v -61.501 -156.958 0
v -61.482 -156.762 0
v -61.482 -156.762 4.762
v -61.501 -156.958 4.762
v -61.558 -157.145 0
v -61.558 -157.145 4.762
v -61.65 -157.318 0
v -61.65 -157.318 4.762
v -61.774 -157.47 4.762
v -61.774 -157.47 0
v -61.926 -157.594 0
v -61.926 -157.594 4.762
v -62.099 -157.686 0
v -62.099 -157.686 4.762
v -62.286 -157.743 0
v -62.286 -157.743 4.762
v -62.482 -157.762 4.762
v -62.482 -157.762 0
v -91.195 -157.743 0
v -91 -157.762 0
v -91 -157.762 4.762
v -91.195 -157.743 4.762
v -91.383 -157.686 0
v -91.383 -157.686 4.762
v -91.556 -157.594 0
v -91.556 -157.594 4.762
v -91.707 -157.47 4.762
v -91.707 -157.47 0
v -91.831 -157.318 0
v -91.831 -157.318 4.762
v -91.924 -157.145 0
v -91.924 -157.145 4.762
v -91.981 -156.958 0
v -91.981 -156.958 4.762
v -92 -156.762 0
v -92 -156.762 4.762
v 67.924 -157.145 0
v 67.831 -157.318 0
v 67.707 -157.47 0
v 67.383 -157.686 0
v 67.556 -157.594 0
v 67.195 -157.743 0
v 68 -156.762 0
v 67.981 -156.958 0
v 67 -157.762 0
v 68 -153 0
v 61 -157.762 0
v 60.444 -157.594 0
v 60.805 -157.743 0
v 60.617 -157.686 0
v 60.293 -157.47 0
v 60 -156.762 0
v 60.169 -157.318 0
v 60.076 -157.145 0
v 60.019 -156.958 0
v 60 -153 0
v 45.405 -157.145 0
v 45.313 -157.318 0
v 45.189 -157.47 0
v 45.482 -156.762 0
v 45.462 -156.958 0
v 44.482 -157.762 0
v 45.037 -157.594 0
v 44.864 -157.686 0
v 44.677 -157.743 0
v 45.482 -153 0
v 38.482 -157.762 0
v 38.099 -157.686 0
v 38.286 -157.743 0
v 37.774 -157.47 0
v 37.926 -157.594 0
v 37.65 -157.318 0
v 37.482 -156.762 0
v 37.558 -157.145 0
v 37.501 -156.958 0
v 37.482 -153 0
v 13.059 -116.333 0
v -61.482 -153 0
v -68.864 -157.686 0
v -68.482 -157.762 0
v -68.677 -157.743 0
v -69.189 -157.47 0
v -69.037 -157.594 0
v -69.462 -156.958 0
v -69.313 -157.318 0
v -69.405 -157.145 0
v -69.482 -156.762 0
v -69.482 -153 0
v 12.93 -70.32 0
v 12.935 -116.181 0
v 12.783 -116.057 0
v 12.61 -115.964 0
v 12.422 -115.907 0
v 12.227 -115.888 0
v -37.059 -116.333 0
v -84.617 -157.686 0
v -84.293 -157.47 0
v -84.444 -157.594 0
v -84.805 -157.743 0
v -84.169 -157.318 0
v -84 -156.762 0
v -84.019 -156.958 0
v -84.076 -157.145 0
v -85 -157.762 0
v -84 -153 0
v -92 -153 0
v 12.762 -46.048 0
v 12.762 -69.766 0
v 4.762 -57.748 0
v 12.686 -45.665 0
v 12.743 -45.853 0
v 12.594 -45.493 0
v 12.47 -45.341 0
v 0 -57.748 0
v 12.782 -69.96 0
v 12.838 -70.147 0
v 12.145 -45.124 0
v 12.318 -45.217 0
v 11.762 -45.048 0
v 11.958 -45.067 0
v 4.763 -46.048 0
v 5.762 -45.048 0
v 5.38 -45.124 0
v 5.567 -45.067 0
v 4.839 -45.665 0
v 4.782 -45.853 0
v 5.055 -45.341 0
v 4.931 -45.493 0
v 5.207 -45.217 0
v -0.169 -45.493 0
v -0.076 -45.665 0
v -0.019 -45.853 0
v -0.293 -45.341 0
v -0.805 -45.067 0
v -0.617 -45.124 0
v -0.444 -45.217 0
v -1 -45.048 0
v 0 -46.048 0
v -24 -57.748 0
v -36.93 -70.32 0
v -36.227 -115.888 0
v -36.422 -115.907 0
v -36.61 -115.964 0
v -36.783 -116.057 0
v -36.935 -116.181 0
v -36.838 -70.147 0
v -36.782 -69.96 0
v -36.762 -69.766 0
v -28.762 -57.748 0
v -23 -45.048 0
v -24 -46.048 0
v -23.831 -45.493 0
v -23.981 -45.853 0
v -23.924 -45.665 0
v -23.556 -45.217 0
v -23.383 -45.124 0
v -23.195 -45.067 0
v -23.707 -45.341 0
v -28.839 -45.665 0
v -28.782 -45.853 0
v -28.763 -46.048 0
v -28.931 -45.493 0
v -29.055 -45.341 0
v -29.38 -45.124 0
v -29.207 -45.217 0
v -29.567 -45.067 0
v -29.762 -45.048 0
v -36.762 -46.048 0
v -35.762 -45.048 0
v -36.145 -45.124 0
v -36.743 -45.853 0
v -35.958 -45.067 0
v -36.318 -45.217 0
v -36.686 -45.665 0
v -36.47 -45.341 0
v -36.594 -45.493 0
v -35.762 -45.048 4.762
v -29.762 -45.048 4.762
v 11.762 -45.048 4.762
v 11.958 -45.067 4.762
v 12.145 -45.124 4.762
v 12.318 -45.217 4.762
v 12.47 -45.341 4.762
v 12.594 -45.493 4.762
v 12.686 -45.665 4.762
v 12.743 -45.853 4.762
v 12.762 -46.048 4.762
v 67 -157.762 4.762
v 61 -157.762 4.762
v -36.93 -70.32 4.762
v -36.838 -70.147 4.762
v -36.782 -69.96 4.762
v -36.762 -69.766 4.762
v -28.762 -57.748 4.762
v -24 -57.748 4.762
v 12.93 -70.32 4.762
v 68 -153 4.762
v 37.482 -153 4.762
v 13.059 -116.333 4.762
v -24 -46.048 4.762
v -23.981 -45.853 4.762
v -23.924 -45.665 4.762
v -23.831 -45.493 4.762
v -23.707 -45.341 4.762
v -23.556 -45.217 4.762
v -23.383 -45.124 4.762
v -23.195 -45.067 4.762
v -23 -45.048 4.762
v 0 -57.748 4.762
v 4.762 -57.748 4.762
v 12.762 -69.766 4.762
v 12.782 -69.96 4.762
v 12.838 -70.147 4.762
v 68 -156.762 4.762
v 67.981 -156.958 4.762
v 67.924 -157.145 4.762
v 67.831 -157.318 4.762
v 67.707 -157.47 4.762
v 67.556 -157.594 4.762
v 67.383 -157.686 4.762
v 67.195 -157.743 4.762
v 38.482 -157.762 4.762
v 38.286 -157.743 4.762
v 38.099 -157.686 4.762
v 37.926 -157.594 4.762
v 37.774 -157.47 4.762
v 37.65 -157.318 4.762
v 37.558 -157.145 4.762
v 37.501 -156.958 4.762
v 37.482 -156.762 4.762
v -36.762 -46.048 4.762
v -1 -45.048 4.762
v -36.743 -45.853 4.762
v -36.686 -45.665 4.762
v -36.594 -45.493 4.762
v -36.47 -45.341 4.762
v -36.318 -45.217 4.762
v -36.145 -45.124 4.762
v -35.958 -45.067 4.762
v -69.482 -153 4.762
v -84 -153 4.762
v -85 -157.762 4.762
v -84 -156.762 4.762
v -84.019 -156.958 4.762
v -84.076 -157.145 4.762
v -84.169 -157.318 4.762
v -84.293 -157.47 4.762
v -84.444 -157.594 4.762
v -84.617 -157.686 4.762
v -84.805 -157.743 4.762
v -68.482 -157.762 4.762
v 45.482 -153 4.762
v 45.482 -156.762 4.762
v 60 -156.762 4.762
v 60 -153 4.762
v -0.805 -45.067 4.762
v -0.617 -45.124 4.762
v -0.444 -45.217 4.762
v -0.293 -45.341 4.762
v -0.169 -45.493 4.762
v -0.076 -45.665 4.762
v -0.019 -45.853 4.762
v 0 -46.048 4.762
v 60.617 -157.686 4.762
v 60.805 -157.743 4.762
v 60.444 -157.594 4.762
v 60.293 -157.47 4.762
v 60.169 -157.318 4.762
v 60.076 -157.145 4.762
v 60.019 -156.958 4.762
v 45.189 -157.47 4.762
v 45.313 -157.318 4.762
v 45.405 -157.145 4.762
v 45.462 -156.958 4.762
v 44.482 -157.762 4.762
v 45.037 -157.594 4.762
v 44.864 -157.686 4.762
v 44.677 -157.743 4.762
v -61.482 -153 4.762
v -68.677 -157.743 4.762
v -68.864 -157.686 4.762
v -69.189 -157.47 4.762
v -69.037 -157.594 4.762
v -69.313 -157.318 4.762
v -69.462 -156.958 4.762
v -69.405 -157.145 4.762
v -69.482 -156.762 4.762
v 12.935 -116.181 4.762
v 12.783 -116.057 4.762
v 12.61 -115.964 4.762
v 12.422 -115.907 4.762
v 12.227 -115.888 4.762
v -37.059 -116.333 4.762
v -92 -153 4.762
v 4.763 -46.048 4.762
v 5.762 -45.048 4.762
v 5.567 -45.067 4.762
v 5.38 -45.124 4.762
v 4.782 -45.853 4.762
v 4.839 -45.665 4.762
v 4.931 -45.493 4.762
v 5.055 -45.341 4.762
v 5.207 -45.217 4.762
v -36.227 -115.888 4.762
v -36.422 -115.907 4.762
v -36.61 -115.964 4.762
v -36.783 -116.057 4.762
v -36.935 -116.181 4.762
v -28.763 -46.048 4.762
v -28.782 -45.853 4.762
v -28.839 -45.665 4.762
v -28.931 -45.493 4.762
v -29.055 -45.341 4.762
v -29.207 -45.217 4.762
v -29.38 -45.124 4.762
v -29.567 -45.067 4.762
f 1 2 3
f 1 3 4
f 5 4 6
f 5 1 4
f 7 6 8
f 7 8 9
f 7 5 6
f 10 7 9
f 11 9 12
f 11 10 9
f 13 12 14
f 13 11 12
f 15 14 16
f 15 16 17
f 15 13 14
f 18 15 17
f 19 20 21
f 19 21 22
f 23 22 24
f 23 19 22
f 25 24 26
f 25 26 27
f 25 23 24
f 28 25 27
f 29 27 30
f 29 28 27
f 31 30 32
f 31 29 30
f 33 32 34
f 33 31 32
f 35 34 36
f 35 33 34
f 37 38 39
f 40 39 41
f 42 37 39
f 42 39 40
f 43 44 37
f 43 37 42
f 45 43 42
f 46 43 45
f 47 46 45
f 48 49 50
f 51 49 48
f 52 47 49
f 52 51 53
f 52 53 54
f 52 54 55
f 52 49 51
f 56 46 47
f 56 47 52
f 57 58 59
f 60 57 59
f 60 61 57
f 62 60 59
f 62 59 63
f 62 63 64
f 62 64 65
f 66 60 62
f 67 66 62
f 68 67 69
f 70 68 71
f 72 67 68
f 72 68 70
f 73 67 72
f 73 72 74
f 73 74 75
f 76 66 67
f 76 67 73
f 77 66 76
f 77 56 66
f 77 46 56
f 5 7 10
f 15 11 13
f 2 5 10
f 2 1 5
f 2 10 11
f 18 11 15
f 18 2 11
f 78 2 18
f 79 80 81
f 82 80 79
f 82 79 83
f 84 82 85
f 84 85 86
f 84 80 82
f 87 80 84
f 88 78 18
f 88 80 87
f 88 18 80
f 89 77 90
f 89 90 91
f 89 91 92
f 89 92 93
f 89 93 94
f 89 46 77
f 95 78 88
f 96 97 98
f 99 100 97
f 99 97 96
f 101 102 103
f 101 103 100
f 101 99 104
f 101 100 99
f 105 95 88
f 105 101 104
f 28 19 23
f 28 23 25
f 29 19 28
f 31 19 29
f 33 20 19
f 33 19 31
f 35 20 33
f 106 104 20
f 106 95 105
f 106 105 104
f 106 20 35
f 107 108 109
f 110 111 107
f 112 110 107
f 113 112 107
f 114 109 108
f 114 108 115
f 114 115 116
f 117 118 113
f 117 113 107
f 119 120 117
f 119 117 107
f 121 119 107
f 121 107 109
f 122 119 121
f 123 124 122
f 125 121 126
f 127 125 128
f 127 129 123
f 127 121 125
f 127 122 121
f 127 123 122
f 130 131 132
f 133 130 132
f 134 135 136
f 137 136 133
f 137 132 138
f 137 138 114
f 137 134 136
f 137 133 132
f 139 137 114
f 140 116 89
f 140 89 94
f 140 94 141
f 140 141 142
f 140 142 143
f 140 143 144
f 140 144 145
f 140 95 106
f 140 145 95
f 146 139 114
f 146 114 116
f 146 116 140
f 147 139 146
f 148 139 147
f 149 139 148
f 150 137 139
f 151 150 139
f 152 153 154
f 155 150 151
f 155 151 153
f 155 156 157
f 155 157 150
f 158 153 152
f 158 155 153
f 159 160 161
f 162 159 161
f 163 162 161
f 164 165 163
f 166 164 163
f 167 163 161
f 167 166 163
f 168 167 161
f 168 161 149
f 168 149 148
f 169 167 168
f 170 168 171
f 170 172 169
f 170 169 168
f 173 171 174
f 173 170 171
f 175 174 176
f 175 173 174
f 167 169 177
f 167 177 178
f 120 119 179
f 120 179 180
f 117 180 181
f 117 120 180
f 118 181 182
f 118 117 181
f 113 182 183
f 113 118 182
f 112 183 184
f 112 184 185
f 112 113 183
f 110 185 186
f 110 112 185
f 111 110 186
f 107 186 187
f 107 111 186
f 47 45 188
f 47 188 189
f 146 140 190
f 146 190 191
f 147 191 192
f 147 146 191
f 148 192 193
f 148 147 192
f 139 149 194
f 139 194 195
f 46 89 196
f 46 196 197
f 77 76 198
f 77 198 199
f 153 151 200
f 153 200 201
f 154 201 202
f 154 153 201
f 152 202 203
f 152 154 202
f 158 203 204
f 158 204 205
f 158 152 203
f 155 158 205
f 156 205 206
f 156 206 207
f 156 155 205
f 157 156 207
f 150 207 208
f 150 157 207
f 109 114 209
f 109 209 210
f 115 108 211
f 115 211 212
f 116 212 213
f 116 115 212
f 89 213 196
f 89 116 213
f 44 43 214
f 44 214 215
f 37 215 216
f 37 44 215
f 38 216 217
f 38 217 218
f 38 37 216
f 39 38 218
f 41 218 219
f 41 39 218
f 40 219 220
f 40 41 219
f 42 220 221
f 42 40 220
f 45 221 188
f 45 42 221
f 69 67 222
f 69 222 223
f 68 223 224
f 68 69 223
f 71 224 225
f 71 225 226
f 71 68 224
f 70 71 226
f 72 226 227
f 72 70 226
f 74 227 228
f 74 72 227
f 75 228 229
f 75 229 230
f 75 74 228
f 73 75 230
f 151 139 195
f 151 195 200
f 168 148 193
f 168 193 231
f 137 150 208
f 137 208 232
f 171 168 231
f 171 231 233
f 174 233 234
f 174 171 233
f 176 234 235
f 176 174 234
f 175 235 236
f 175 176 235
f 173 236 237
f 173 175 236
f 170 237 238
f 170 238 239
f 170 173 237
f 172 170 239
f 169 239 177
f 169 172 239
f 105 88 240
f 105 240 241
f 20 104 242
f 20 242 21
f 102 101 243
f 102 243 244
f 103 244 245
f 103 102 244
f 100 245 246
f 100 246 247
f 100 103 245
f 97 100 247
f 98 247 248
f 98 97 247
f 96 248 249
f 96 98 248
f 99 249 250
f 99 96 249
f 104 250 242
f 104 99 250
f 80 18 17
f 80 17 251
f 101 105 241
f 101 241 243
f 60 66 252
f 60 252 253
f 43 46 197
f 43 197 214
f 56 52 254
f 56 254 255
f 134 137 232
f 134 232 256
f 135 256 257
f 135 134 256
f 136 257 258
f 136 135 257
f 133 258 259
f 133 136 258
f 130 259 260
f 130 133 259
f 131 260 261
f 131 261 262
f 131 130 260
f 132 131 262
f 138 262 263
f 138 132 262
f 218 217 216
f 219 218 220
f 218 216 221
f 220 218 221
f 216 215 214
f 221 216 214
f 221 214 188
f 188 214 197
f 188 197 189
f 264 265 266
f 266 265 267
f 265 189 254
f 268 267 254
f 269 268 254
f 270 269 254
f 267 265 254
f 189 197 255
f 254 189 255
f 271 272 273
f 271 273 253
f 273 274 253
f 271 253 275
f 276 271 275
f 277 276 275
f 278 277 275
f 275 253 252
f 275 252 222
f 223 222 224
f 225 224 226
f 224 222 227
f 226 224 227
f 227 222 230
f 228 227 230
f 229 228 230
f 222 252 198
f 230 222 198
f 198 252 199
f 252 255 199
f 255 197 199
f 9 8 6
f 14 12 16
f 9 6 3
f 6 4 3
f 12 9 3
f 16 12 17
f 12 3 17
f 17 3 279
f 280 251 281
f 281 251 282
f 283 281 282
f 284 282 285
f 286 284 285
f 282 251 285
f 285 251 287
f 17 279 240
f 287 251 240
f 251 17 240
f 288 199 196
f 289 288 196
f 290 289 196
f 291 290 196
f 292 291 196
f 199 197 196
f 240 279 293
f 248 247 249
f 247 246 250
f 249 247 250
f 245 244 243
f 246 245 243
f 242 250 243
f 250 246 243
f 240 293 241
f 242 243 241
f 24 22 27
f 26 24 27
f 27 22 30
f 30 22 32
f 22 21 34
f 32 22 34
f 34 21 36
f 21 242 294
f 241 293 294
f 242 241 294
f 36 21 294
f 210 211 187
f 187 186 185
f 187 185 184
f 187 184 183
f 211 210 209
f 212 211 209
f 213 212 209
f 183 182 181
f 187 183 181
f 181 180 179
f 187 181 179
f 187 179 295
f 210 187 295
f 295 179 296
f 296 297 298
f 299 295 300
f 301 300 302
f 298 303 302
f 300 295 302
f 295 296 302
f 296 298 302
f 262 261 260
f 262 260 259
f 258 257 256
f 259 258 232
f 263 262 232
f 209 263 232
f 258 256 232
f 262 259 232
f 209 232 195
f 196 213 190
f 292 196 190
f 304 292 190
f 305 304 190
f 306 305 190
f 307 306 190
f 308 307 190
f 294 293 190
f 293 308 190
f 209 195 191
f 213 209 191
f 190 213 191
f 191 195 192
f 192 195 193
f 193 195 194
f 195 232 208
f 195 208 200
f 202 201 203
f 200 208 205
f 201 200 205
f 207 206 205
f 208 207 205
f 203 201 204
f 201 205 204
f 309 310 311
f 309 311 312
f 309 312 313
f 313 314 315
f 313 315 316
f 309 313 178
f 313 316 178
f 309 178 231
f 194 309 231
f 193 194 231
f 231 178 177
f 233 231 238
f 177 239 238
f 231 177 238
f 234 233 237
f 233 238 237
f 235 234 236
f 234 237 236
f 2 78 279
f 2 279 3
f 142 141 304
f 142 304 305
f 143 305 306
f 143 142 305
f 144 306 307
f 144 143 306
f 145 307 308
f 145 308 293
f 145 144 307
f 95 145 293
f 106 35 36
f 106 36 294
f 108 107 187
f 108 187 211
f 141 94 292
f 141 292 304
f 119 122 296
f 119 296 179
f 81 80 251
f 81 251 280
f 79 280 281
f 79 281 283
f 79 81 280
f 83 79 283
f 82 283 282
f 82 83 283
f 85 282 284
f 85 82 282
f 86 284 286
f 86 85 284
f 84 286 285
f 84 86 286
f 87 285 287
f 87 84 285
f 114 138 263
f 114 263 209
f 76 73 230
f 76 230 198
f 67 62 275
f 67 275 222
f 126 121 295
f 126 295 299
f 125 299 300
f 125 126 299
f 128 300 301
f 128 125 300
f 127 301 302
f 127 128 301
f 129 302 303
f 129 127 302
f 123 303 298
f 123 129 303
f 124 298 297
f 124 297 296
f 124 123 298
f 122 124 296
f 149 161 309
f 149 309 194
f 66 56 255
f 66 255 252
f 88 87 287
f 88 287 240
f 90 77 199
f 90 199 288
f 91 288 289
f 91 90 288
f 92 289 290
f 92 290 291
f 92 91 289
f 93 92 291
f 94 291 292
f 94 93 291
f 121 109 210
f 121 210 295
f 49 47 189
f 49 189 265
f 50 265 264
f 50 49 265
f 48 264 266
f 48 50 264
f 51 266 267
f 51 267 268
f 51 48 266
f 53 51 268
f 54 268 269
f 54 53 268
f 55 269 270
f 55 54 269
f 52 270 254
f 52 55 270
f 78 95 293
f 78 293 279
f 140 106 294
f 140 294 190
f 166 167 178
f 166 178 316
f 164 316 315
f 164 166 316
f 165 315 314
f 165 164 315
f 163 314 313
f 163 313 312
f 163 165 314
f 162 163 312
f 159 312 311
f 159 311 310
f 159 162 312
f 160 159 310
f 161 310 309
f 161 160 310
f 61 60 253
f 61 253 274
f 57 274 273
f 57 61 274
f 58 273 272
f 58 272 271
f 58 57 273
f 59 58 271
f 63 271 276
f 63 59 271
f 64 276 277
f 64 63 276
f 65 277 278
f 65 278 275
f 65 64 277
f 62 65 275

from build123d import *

# Parameters (mm, degrees)
BOSS_EXTRUDE1_DEPTH = 4.7625


with BuildPart() as part:
    # Sketch2 → Boss-Extrude1 (new body)
    with BuildSketch(Plane.XY):
        with BuildLine():
            Line((-23, -45.048102255), (-1, -45.048102255))
            ThreePointArc((-1, -45.048102255), (-0.292893219, -45.340995473), (0, -46.048102255))
            Line((0, -46.048102255), (0, -57.748102255))
            Line((0, -57.748102255), (4.7625, -57.748102255))
            Line((4.7625, -57.748102255), (4.7625, -46.048102255))
            ThreePointArc((4.7625, -46.048102255), (5.055393219, -45.340995473), (5.7625, -45.048102255))
            Line((5.7625, -45.048102255), (11.7625, -45.048102255))
            ThreePointArc((11.7625, -45.048102255), (12.469606781, -45.340995473), (12.7625, -46.048102255))
            Line((12.7625, -46.048102255), (12.7625, -69.765561421))
            ThreePointArc((12.7625, -69.765561421), (12.805346982, -70.055144052), (12.9302162, -70.319911199))
            Line((12.9302162, -70.319911199), (68, -153))
            Line((68, -153), (68, -156.7625))
            ThreePointArc((68, -156.7625), (67.707106781, -157.469606781), (67, -157.7625))
            Line((67, -157.7625), (61, -157.7625))
            ThreePointArc((61, -157.7625), (60.292893219, -157.469606781), (60, -156.7625))
            Line((60, -156.7625), (60, -153))
            Line((60, -153), (45.481563848, -153))
            Line((45.481563848, -153), (45.481563848, -156.7625))
            ThreePointArc((45.481563848, -156.7625), (45.188670629, -157.469606781), (44.481563848, -157.7625))
            Line((44.481563848, -157.7625), (38.481563848, -157.7625))
            ThreePointArc((38.481563848, -157.7625), (37.774457067, -157.469606781), (37.481563848, -156.7625))
            Line((37.481563848, -156.7625), (37.481563848, -153))
            Line((37.481563848, -153), (13.059329161, -116.333203921))
            ThreePointArc((13.059329161, -116.333203921), (12.699088908, -116.005978468), (12.227045361, -115.8875537))
            Line((12.227045361, -115.8875537), (-36.227045361, -115.8875537))
            ThreePointArc((-36.227045361, -115.8875537), (-36.699088908, -116.005978468), (-37.059329161, -116.333203921))
            Line((-37.059329161, -116.333203921), (-61.481563848, -153))
            Line((-61.481563848, -153), (-61.481563848, -156.7625))
            ThreePointArc((-61.481563848, -156.7625), (-61.774457067, -157.469606781), (-62.481563848, -157.7625))
            Line((-62.481563848, -157.7625), (-68.481563848, -157.7625))
            ThreePointArc((-68.481563848, -157.7625), (-69.188670629, -157.469606781), (-69.481563848, -156.7625))
            Line((-69.481563848, -156.7625), (-69.481563848, -153))
            Line((-69.481563848, -153), (-84, -153))
            Line((-84, -153), (-84, -156.7625))
            ThreePointArc((-84, -156.7625), (-84.292893219, -157.469606781), (-85, -157.7625))
            Line((-85, -157.7625), (-91, -157.7625))
            ThreePointArc((-91, -157.7625), (-91.707106781, -157.469606781), (-92, -156.7625))
            Line((-92, -156.7625), (-92, -153))
            Line((-92, -153), (-36.9302162, -70.319911199))
            ThreePointArc((-36.9302162, -70.319911199), (-36.805346982, -70.055144052), (-36.7625, -69.765561421))
            Line((-36.7625, -69.765561421), (-36.7625, -46.048102255))
            ThreePointArc((-36.7625, -46.048102255), (-36.469606781, -45.340995473), (-35.7625, -45.048102255))
            Line((-35.7625, -45.048102255), (-29.7625, -45.048102255))
            ThreePointArc((-29.7625, -45.048102255), (-29.055393219, -45.340995473), (-28.7625, -46.048102255))
            Line((-28.7625, -46.048102255), (-28.7625, -57.748102255))
            Line((-28.7625, -57.748102255), (-24, -57.748102255))
            Line((-24, -57.748102255), (-24, -46.048102255))
            ThreePointArc((-24, -46.048102255), (-23.707106781, -45.340995473), (-23, -45.048102255))
        make_face()
    extrude(amount=BOSS_EXTRUDE1_DEPTH)


solid = part.part
